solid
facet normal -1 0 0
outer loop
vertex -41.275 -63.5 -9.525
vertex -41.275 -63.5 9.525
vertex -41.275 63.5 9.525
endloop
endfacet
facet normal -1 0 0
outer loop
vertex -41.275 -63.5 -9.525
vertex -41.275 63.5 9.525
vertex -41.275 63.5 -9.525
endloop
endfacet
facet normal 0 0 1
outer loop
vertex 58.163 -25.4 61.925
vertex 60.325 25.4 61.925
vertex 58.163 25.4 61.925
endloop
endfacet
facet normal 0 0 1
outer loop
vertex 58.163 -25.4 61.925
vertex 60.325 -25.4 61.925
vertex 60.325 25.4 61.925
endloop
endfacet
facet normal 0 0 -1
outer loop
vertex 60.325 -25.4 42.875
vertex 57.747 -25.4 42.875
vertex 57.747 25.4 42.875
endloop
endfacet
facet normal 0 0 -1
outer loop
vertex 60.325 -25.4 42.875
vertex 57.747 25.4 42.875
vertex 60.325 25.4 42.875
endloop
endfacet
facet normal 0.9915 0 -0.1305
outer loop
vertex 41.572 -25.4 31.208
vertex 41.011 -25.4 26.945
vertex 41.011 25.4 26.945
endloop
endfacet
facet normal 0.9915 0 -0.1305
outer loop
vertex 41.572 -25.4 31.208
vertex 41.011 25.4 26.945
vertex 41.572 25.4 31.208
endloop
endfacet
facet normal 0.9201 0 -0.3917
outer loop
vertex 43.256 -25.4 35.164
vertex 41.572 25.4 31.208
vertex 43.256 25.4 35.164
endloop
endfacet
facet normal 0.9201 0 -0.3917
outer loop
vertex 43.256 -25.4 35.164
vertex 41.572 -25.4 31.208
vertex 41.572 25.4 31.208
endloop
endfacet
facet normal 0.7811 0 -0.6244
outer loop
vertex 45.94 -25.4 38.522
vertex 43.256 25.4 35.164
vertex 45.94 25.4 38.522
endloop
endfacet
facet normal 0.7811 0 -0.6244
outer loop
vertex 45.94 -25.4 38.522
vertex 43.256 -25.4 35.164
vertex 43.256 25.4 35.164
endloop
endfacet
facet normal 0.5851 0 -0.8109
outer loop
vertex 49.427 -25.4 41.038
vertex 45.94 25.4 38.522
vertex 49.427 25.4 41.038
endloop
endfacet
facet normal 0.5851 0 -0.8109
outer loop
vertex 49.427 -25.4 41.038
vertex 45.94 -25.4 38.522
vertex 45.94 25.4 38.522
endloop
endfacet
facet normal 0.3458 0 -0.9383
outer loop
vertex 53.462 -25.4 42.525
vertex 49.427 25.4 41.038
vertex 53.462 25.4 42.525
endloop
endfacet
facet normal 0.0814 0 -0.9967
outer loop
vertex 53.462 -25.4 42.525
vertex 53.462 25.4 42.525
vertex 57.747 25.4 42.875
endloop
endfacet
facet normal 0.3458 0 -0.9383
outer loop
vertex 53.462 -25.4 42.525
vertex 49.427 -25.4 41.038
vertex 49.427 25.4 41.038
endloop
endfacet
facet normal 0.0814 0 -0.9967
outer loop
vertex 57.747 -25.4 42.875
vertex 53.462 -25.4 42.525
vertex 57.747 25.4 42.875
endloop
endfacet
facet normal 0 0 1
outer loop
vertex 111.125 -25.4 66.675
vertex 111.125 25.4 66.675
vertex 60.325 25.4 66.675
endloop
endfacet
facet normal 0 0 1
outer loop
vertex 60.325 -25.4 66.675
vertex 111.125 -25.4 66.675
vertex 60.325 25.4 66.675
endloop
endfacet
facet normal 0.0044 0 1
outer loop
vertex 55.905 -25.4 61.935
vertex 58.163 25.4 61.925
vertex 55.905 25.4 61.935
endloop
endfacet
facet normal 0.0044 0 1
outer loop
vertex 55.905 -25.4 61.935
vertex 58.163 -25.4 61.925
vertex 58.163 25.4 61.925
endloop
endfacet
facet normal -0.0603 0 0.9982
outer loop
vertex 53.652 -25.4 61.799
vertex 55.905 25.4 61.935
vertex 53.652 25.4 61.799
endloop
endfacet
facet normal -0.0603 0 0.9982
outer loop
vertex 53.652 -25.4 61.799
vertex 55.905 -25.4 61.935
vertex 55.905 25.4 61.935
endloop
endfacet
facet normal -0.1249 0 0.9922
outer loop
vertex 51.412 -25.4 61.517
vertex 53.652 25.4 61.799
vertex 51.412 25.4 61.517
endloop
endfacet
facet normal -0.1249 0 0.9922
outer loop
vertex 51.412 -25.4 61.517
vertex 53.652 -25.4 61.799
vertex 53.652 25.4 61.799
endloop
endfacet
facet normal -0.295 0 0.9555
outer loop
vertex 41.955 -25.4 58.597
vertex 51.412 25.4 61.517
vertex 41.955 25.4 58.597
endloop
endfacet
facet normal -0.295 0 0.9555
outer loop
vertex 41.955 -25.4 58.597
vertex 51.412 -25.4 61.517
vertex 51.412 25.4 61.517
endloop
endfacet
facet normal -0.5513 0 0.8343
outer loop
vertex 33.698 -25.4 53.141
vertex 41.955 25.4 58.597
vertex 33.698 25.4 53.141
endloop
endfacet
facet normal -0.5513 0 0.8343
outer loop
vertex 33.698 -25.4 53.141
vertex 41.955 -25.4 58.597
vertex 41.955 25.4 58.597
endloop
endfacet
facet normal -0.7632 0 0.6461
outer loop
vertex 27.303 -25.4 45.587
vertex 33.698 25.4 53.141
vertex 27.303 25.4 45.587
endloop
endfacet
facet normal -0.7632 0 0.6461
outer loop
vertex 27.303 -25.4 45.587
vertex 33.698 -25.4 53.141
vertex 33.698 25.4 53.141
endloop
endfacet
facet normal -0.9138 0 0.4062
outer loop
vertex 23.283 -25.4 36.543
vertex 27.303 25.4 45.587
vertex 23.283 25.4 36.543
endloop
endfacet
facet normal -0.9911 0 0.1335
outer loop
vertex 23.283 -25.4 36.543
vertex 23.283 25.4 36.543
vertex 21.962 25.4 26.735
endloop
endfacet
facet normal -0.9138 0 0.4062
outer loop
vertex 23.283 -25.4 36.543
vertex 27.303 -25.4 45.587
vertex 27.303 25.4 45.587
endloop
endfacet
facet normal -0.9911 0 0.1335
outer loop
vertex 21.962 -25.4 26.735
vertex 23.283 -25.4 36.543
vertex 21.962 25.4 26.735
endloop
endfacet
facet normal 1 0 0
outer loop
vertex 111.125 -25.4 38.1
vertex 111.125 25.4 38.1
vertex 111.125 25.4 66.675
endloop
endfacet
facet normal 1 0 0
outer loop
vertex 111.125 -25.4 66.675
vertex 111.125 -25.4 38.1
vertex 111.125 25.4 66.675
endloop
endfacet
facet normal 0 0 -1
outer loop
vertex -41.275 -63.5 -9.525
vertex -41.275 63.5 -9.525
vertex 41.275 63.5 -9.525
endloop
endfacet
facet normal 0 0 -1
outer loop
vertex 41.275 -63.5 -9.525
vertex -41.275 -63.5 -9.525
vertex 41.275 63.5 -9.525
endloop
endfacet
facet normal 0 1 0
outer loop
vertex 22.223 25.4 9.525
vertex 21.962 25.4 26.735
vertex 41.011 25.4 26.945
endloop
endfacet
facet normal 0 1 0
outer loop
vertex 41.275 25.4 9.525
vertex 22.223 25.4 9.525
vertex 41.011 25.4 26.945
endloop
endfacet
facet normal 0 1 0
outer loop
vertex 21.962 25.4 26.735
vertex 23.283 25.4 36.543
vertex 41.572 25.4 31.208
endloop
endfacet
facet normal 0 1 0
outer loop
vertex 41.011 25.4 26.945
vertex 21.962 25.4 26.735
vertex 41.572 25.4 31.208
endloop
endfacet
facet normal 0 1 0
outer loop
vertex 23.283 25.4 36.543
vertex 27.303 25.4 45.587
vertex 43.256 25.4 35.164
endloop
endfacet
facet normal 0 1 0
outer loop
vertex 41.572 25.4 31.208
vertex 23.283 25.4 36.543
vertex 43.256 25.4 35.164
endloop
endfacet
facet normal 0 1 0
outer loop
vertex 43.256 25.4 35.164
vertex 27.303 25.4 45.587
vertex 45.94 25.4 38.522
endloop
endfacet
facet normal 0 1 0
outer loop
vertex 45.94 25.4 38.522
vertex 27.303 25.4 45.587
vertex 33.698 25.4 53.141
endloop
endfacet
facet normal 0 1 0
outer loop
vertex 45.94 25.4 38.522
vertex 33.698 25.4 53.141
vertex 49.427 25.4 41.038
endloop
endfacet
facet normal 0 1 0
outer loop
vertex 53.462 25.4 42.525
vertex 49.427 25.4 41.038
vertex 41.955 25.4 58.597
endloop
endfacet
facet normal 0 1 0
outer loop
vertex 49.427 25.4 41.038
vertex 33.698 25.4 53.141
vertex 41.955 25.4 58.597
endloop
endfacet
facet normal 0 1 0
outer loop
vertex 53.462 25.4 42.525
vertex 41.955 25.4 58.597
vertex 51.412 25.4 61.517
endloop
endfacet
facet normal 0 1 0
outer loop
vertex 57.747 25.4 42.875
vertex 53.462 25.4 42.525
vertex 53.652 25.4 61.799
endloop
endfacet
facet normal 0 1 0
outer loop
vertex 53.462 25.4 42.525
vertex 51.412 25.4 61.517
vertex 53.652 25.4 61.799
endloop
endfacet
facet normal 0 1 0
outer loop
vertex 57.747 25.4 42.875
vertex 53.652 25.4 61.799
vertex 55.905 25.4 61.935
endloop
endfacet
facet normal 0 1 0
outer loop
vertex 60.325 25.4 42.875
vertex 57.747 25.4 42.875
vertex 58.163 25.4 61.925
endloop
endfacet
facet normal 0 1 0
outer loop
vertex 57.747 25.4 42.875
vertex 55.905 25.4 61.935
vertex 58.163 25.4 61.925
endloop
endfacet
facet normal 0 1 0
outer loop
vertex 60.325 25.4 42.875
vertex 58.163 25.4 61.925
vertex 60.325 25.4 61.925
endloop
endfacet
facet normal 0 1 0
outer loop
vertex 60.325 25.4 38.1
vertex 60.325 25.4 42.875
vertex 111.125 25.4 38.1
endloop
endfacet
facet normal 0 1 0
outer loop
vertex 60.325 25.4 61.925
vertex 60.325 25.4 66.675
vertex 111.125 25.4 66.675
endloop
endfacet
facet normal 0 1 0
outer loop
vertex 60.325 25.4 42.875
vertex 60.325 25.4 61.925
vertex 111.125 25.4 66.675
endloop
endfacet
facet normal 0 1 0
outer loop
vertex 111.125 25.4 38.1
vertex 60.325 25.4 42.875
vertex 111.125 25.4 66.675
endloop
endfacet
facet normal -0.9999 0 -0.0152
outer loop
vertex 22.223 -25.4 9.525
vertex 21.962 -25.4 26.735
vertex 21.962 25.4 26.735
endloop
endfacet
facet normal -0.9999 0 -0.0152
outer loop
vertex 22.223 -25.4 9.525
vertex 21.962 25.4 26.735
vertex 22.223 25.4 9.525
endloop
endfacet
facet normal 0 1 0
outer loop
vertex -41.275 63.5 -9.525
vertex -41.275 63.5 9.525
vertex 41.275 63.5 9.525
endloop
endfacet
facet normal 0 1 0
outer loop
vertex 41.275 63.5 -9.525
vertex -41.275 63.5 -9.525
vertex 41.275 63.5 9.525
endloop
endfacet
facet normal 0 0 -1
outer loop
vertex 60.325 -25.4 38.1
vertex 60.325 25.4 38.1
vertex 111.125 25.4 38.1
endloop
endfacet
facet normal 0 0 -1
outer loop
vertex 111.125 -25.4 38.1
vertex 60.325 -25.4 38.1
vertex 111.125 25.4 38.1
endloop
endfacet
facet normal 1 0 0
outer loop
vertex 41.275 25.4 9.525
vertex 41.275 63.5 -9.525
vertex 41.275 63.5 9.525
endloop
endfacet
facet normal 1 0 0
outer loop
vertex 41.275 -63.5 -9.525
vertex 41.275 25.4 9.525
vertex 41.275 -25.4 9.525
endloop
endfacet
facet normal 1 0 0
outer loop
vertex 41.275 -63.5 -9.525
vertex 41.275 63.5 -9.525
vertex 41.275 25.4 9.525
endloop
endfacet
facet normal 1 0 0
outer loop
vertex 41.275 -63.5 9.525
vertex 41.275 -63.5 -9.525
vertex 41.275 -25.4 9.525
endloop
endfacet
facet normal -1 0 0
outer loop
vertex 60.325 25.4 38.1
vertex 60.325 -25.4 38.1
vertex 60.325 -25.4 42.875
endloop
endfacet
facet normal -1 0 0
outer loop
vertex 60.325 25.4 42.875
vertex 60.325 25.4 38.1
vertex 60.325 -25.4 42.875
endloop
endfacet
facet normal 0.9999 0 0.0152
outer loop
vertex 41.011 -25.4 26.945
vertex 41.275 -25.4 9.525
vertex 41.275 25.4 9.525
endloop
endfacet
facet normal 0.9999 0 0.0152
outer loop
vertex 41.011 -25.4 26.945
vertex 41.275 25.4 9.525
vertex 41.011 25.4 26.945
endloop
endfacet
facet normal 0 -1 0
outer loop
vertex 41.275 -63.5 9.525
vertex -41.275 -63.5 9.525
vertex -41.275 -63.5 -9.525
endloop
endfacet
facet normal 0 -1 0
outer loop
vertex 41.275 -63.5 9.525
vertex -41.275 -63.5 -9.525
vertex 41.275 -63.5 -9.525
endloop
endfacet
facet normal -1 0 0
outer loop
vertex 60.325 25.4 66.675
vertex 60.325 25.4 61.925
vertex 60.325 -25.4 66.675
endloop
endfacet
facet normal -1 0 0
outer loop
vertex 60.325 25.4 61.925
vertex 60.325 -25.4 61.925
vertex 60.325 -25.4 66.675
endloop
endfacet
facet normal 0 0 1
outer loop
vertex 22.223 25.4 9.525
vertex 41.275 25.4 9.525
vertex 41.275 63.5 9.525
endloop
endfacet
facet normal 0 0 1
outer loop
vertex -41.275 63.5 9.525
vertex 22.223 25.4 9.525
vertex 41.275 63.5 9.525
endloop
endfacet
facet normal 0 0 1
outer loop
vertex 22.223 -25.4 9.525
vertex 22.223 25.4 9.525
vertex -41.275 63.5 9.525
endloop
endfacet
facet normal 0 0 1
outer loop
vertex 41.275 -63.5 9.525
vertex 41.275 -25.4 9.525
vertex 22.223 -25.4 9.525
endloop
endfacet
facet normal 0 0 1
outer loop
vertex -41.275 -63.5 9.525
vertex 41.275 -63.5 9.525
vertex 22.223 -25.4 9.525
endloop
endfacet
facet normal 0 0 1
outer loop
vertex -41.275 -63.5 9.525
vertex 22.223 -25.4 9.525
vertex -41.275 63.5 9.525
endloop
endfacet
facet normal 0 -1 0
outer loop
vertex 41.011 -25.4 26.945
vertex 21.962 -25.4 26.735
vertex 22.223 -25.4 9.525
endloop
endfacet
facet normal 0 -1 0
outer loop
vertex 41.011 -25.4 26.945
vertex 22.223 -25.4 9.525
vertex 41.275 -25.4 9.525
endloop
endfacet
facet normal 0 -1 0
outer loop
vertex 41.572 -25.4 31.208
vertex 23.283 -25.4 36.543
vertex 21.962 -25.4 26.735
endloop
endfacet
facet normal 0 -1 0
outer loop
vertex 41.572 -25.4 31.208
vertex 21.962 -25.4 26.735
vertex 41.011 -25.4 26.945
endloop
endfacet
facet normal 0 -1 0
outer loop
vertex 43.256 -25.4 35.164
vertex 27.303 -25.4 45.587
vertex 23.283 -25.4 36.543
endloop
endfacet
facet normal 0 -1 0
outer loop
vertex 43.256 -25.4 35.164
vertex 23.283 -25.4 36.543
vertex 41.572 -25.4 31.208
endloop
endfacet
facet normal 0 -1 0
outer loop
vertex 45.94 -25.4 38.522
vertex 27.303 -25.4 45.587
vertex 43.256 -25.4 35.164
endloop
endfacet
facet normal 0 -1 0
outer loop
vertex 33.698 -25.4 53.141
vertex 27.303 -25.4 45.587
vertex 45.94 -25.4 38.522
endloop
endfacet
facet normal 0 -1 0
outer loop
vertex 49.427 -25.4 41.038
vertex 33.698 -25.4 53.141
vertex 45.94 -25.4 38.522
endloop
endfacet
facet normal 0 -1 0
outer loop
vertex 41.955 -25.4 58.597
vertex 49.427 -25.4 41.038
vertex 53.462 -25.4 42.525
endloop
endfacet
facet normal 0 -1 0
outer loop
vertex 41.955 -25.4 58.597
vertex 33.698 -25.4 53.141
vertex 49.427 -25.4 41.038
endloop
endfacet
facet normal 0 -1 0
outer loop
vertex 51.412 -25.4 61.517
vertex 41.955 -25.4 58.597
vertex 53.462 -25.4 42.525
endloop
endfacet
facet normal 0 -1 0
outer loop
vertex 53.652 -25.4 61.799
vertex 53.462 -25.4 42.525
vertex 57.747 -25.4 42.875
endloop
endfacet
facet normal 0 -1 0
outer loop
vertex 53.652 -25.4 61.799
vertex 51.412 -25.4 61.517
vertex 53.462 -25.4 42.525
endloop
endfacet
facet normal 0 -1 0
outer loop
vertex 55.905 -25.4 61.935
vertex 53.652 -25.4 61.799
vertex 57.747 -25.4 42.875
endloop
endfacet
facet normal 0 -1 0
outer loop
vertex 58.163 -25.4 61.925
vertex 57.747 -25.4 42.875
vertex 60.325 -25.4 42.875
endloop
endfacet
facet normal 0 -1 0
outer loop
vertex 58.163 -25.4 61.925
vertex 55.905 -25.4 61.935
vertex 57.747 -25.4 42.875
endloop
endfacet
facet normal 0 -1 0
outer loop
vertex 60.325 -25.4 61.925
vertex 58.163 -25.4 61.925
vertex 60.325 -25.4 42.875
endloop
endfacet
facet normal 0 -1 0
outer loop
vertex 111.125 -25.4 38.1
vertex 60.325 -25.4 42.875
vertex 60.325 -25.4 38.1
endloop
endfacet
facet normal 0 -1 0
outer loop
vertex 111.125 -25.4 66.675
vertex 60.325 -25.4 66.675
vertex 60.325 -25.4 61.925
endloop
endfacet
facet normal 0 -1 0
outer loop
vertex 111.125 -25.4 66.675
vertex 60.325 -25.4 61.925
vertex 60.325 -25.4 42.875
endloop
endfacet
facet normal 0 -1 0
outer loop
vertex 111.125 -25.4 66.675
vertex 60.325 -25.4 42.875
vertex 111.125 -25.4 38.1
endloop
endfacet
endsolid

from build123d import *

# Parameters (mm, degrees)
F1_DEPTH = 63.5
F0_W     = 25.4
F0_H     = 19.05
F0_H_2   = 4.7752
F0_H_3   = 4.7498
F2_DEPTH = 25.4


# Not quite as in the source:
# - a feature of the source that left no trace in its solid (it failed there, or was rolled back) is left out


with BuildPart() as f1:
    # F0 (on Front) → F1 (new body, symmetric)
    with BuildSketch(Plane.XZ):
        Polygon((41.275, -9.525), (41.275, 9.525), (22.2228064707, 9.525), (-41.275, 9.525), (-41.275, -9.525), align=None)
    extrude(amount=F1_DEPTH, both=True)

    # F0 (on Front) → F2 (join, symmetric)
    with BuildSketch(Plane.XZ):
        with BuildLine():
            add(Edge.make_bspline(
                [(51.4118423464, 61.5169892273), (53.7469843796, 61.749049716), (56.003883812, 61.8875588148), (58.1631200711, 61.9252)],
                knots=[105.6886926289, 105.6886926289, 105.6886926289, 105.6886926289, 112.3998251036, 112.3998251036, 112.3998251036, 112.3998251036], degree=3))
            ThreePointArc((58.1631200711, 61.9252), (54.7775761271, 61.8849118409), (51.4118423464, 61.5169892273))
        make_face()
        Polygon((41.275, -9.525), (41.275, 9.525), (22.2228064707, 9.525), (-41.275, 9.525), (-41.275, -9.525), align=None)
        with BuildLine():
            Line((41.275, 9.525), (41.0106324272, 26.945333009))
            ThreePointArc((41.0106324272, 26.945333009), (45.9404876374, 38.5224332318), (57.7466785314, 42.8752))
            Line((57.7466785314, 42.8752), (60.325, 42.8752))
            Line((60.325, 42.8752), (60.325, 61.9252))
            Line((60.325, 61.9252), (58.1631200711, 61.9252))
            add(Edge.make_bspline(
                [(51.4118423464, 61.5169892273), (53.7469843796, 61.749049716), (56.003883812, 61.8875588148), (58.1631200711, 61.9252)],
                knots=[105.6886926289, 105.6886926289, 105.6886926289, 105.6886926289, 112.3998251036, 112.3998251036, 112.3998251036, 112.3998251036], degree=3))
            ThreePointArc((51.4118423464, 61.5169892273), (30.2314207387, 49.5916736898), (21.9616330248, 26.7348580473))
            Line((21.9616330248, 26.7348580473), (22.2228064707, 9.525))
            Line((22.2228064707, 9.525), (41.275, 9.525))
        make_face()
        with Locations((73.025, 52.4002)):
            Rectangle(F0_W, F0_H)
        with Locations((73.025, 40.4876)):
            Rectangle(F0_W, F0_H_2)
        Polygon((85.725, 61.9252), (85.725, 42.8752), (85.725, 38.1), (111.125, 38.1), (111.125, 66.675), (85.725, 66.675), align=None)
        with Locations((73.025, 64.3001)):
            Rectangle(F0_W, F0_H_3)
    extrude(amount=F2_DEPTH, both=True)


solid = f1.part
